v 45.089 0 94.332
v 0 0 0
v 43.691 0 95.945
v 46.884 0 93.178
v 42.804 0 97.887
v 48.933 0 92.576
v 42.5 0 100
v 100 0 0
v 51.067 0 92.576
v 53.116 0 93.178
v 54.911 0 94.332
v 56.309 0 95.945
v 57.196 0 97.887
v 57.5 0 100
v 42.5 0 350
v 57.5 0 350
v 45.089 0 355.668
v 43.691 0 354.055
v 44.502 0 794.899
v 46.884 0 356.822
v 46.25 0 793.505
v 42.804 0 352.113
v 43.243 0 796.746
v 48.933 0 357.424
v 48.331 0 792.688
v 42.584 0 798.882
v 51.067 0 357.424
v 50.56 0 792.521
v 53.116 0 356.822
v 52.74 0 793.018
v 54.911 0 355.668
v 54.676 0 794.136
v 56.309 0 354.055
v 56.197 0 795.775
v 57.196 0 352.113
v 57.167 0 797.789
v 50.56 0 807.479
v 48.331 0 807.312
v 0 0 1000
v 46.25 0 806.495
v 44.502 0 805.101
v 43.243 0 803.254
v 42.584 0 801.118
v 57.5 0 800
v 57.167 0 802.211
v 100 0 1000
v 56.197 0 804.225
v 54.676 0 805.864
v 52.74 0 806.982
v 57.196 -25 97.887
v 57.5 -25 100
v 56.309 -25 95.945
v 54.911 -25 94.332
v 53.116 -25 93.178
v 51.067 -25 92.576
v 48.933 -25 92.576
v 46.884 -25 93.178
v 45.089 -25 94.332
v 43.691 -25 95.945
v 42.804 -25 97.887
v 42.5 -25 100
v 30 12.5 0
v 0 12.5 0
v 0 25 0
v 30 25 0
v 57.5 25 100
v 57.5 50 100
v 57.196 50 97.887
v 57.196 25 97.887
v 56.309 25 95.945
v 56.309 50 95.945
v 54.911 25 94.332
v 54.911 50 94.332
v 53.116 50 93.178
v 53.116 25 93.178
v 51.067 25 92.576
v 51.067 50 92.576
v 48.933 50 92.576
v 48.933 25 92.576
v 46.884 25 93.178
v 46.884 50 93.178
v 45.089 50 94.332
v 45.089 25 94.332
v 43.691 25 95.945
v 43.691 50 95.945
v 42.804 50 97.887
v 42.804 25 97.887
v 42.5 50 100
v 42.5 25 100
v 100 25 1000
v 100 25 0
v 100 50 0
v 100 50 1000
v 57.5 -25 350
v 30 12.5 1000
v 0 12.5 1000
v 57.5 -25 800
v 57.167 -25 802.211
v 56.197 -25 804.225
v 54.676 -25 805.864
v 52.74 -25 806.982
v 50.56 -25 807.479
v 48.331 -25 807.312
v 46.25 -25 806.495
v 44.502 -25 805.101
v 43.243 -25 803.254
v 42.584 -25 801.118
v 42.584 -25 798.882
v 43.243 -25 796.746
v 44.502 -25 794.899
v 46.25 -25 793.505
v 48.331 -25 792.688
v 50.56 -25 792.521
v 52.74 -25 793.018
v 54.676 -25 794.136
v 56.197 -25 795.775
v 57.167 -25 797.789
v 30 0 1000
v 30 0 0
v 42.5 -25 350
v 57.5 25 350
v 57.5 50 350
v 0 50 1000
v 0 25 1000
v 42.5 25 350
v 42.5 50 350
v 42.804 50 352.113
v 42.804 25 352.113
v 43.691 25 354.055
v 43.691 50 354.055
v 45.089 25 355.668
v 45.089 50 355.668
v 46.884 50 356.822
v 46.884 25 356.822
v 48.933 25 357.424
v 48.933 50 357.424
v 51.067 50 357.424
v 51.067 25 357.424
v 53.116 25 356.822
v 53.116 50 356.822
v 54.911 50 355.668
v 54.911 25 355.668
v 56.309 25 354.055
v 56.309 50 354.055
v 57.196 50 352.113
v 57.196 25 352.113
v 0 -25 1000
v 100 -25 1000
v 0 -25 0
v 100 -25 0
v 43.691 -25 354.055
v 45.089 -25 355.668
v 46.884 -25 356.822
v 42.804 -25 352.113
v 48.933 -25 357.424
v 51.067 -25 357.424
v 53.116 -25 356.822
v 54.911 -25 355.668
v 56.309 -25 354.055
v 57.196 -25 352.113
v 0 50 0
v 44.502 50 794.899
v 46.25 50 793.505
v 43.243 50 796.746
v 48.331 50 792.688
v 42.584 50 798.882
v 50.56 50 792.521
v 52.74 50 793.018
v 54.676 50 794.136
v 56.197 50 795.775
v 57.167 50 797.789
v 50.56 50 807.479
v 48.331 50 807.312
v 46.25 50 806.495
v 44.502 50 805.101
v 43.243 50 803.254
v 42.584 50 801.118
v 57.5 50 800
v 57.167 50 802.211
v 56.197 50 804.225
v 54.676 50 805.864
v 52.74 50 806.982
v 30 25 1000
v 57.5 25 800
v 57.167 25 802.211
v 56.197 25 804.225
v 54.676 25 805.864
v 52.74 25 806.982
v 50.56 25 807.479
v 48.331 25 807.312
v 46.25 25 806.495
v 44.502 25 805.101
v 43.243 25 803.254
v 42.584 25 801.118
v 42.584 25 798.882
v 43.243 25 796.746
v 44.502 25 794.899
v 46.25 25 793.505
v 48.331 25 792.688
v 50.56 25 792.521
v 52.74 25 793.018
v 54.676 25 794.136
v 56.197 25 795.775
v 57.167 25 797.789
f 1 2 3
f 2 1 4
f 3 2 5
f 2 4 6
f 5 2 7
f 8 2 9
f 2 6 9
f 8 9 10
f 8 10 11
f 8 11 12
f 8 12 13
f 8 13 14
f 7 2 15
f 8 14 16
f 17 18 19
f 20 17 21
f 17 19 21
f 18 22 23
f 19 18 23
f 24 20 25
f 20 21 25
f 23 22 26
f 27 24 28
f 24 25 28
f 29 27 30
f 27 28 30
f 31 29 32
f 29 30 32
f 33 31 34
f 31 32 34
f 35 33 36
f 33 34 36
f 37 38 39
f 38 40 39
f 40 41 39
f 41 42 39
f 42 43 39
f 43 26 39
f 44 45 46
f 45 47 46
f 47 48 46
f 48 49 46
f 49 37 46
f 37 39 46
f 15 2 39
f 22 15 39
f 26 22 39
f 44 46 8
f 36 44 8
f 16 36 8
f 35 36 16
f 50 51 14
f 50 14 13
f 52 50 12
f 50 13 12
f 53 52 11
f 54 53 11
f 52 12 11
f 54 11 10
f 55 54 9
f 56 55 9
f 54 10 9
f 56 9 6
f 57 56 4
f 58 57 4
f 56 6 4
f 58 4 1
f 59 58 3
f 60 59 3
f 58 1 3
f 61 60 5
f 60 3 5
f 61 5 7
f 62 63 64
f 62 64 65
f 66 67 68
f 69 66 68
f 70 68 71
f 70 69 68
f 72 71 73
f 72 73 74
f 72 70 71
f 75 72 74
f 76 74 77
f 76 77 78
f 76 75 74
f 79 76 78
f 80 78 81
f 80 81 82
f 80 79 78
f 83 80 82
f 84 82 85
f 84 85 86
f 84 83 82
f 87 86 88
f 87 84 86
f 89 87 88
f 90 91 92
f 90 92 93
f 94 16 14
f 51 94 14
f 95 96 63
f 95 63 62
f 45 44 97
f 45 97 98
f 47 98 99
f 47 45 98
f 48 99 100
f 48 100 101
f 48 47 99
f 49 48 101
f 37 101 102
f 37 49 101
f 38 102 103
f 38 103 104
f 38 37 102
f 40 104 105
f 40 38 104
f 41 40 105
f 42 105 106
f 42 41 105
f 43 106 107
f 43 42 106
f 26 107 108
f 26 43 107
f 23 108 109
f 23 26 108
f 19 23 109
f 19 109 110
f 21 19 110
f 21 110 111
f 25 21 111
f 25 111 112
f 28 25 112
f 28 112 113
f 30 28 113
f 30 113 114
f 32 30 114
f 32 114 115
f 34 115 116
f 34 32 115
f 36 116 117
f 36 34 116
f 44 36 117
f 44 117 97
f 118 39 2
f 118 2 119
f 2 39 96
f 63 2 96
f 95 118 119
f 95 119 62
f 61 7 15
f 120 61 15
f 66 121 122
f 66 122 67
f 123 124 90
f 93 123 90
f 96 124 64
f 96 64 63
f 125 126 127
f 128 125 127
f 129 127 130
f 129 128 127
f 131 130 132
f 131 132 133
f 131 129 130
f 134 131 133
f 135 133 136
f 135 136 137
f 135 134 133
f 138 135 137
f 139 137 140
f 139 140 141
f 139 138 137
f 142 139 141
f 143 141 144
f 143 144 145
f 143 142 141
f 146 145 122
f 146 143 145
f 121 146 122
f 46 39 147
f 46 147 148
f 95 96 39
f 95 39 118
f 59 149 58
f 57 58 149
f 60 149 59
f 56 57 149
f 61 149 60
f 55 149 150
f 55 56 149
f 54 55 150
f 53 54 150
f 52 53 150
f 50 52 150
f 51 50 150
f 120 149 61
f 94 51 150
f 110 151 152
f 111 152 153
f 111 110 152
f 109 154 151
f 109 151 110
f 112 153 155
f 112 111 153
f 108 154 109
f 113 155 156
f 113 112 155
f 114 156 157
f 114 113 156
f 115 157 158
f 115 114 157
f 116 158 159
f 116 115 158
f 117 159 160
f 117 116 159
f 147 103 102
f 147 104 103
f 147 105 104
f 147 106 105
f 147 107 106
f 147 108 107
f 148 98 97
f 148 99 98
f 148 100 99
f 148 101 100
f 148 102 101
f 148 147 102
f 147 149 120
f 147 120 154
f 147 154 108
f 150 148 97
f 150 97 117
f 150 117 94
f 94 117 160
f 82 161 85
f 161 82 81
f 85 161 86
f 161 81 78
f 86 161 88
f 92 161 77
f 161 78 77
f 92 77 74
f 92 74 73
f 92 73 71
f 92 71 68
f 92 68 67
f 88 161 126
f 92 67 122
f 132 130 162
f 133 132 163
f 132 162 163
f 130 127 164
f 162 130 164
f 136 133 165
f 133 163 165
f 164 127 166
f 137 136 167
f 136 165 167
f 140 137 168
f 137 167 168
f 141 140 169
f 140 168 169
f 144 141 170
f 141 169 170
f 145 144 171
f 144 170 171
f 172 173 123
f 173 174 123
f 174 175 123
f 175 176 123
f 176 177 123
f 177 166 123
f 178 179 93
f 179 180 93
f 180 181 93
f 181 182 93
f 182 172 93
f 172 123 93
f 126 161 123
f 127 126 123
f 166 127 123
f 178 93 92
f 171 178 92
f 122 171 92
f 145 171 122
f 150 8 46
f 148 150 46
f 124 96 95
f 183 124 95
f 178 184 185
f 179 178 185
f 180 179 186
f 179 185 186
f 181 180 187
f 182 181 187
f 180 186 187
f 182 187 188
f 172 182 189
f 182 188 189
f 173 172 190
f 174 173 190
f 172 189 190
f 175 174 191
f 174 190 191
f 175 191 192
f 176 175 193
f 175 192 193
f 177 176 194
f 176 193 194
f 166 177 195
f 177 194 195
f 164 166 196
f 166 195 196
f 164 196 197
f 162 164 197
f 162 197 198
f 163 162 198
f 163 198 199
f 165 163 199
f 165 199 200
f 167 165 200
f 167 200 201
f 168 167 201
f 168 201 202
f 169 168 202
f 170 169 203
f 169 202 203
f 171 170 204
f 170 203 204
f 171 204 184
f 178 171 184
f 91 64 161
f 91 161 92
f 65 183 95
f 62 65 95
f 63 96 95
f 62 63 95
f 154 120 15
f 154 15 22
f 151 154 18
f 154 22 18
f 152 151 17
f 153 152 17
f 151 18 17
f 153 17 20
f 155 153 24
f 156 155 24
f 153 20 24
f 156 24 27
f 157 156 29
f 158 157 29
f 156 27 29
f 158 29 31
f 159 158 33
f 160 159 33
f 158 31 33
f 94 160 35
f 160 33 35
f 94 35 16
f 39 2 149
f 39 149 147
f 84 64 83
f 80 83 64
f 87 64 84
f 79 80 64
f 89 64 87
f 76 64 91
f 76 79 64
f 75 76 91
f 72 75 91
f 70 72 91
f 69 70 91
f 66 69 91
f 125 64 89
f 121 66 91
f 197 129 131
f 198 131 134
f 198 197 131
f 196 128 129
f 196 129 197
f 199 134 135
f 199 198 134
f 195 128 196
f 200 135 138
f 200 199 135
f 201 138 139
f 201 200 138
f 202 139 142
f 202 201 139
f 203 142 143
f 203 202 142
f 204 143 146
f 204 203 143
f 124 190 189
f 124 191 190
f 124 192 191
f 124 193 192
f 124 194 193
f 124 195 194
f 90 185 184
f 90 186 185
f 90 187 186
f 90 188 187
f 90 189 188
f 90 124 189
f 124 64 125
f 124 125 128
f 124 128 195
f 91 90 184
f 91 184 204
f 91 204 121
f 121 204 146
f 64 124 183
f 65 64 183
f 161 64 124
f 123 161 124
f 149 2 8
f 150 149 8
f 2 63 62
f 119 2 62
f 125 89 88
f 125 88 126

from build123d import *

# Parameters (mm, degrees)
F0_W     = 100
F0_H     = 1000
F0_R     = 7.5
F1_DEPTH = 25
F2_W     = 30
F2_H     = 12.5
F3_DEPTH = 1000


# Not quite as in the source:
# - a feature names something its author has since deleted; it is built from what else it names


with BuildPart() as f1:
    # F0 (on Front) → F1 (new body)
    with BuildSketch(Plane.XZ):
        with Locations((50, 500)):
            Rectangle(F0_W, F0_H)
        with BuildLine():
            Line((57.5, 350), (57.5, 100))
            ThreePointArc((57.5, 100), (50, 92.5), (42.5, 100))
            Line((42.5, 100), (42.5, 350))
            ThreePointArc((42.5, 350), (50, 357.5), (57.5, 350))
        make_face(mode=Mode.SUBTRACT)
        with Locations((50, 800)):
            Circle(F0_R, mode=Mode.SUBTRACT)
    extrude(amount=F1_DEPTH)


with BuildPart() as f3:
    # F2 (on face) → F3 (new body, through all)
    with BuildSketch(Plane.XY.offset(1000)):
        with Locations((15, 6.25)):
            Rectangle(F2_W, F2_H)
    extrude(amount=-F3_DEPTH)


with BuildPart() as f4_1:
    # F4: instance of F1
    add(f1.part.mirror(Plane(origin=(15, 12.5, 500), x_dir=(-1, 0, 0), z_dir=(0, 1, 0))))


with BuildPart() as f4_2:
    # F4: instance of F3
    add(f3.part.mirror(Plane(origin=(15, 12.5, 500), x_dir=(-1, 0, 0), z_dir=(0, 1, 0))))


solid = Compound([f1.part, f3.part, f4_1.part, f4_2.part])
